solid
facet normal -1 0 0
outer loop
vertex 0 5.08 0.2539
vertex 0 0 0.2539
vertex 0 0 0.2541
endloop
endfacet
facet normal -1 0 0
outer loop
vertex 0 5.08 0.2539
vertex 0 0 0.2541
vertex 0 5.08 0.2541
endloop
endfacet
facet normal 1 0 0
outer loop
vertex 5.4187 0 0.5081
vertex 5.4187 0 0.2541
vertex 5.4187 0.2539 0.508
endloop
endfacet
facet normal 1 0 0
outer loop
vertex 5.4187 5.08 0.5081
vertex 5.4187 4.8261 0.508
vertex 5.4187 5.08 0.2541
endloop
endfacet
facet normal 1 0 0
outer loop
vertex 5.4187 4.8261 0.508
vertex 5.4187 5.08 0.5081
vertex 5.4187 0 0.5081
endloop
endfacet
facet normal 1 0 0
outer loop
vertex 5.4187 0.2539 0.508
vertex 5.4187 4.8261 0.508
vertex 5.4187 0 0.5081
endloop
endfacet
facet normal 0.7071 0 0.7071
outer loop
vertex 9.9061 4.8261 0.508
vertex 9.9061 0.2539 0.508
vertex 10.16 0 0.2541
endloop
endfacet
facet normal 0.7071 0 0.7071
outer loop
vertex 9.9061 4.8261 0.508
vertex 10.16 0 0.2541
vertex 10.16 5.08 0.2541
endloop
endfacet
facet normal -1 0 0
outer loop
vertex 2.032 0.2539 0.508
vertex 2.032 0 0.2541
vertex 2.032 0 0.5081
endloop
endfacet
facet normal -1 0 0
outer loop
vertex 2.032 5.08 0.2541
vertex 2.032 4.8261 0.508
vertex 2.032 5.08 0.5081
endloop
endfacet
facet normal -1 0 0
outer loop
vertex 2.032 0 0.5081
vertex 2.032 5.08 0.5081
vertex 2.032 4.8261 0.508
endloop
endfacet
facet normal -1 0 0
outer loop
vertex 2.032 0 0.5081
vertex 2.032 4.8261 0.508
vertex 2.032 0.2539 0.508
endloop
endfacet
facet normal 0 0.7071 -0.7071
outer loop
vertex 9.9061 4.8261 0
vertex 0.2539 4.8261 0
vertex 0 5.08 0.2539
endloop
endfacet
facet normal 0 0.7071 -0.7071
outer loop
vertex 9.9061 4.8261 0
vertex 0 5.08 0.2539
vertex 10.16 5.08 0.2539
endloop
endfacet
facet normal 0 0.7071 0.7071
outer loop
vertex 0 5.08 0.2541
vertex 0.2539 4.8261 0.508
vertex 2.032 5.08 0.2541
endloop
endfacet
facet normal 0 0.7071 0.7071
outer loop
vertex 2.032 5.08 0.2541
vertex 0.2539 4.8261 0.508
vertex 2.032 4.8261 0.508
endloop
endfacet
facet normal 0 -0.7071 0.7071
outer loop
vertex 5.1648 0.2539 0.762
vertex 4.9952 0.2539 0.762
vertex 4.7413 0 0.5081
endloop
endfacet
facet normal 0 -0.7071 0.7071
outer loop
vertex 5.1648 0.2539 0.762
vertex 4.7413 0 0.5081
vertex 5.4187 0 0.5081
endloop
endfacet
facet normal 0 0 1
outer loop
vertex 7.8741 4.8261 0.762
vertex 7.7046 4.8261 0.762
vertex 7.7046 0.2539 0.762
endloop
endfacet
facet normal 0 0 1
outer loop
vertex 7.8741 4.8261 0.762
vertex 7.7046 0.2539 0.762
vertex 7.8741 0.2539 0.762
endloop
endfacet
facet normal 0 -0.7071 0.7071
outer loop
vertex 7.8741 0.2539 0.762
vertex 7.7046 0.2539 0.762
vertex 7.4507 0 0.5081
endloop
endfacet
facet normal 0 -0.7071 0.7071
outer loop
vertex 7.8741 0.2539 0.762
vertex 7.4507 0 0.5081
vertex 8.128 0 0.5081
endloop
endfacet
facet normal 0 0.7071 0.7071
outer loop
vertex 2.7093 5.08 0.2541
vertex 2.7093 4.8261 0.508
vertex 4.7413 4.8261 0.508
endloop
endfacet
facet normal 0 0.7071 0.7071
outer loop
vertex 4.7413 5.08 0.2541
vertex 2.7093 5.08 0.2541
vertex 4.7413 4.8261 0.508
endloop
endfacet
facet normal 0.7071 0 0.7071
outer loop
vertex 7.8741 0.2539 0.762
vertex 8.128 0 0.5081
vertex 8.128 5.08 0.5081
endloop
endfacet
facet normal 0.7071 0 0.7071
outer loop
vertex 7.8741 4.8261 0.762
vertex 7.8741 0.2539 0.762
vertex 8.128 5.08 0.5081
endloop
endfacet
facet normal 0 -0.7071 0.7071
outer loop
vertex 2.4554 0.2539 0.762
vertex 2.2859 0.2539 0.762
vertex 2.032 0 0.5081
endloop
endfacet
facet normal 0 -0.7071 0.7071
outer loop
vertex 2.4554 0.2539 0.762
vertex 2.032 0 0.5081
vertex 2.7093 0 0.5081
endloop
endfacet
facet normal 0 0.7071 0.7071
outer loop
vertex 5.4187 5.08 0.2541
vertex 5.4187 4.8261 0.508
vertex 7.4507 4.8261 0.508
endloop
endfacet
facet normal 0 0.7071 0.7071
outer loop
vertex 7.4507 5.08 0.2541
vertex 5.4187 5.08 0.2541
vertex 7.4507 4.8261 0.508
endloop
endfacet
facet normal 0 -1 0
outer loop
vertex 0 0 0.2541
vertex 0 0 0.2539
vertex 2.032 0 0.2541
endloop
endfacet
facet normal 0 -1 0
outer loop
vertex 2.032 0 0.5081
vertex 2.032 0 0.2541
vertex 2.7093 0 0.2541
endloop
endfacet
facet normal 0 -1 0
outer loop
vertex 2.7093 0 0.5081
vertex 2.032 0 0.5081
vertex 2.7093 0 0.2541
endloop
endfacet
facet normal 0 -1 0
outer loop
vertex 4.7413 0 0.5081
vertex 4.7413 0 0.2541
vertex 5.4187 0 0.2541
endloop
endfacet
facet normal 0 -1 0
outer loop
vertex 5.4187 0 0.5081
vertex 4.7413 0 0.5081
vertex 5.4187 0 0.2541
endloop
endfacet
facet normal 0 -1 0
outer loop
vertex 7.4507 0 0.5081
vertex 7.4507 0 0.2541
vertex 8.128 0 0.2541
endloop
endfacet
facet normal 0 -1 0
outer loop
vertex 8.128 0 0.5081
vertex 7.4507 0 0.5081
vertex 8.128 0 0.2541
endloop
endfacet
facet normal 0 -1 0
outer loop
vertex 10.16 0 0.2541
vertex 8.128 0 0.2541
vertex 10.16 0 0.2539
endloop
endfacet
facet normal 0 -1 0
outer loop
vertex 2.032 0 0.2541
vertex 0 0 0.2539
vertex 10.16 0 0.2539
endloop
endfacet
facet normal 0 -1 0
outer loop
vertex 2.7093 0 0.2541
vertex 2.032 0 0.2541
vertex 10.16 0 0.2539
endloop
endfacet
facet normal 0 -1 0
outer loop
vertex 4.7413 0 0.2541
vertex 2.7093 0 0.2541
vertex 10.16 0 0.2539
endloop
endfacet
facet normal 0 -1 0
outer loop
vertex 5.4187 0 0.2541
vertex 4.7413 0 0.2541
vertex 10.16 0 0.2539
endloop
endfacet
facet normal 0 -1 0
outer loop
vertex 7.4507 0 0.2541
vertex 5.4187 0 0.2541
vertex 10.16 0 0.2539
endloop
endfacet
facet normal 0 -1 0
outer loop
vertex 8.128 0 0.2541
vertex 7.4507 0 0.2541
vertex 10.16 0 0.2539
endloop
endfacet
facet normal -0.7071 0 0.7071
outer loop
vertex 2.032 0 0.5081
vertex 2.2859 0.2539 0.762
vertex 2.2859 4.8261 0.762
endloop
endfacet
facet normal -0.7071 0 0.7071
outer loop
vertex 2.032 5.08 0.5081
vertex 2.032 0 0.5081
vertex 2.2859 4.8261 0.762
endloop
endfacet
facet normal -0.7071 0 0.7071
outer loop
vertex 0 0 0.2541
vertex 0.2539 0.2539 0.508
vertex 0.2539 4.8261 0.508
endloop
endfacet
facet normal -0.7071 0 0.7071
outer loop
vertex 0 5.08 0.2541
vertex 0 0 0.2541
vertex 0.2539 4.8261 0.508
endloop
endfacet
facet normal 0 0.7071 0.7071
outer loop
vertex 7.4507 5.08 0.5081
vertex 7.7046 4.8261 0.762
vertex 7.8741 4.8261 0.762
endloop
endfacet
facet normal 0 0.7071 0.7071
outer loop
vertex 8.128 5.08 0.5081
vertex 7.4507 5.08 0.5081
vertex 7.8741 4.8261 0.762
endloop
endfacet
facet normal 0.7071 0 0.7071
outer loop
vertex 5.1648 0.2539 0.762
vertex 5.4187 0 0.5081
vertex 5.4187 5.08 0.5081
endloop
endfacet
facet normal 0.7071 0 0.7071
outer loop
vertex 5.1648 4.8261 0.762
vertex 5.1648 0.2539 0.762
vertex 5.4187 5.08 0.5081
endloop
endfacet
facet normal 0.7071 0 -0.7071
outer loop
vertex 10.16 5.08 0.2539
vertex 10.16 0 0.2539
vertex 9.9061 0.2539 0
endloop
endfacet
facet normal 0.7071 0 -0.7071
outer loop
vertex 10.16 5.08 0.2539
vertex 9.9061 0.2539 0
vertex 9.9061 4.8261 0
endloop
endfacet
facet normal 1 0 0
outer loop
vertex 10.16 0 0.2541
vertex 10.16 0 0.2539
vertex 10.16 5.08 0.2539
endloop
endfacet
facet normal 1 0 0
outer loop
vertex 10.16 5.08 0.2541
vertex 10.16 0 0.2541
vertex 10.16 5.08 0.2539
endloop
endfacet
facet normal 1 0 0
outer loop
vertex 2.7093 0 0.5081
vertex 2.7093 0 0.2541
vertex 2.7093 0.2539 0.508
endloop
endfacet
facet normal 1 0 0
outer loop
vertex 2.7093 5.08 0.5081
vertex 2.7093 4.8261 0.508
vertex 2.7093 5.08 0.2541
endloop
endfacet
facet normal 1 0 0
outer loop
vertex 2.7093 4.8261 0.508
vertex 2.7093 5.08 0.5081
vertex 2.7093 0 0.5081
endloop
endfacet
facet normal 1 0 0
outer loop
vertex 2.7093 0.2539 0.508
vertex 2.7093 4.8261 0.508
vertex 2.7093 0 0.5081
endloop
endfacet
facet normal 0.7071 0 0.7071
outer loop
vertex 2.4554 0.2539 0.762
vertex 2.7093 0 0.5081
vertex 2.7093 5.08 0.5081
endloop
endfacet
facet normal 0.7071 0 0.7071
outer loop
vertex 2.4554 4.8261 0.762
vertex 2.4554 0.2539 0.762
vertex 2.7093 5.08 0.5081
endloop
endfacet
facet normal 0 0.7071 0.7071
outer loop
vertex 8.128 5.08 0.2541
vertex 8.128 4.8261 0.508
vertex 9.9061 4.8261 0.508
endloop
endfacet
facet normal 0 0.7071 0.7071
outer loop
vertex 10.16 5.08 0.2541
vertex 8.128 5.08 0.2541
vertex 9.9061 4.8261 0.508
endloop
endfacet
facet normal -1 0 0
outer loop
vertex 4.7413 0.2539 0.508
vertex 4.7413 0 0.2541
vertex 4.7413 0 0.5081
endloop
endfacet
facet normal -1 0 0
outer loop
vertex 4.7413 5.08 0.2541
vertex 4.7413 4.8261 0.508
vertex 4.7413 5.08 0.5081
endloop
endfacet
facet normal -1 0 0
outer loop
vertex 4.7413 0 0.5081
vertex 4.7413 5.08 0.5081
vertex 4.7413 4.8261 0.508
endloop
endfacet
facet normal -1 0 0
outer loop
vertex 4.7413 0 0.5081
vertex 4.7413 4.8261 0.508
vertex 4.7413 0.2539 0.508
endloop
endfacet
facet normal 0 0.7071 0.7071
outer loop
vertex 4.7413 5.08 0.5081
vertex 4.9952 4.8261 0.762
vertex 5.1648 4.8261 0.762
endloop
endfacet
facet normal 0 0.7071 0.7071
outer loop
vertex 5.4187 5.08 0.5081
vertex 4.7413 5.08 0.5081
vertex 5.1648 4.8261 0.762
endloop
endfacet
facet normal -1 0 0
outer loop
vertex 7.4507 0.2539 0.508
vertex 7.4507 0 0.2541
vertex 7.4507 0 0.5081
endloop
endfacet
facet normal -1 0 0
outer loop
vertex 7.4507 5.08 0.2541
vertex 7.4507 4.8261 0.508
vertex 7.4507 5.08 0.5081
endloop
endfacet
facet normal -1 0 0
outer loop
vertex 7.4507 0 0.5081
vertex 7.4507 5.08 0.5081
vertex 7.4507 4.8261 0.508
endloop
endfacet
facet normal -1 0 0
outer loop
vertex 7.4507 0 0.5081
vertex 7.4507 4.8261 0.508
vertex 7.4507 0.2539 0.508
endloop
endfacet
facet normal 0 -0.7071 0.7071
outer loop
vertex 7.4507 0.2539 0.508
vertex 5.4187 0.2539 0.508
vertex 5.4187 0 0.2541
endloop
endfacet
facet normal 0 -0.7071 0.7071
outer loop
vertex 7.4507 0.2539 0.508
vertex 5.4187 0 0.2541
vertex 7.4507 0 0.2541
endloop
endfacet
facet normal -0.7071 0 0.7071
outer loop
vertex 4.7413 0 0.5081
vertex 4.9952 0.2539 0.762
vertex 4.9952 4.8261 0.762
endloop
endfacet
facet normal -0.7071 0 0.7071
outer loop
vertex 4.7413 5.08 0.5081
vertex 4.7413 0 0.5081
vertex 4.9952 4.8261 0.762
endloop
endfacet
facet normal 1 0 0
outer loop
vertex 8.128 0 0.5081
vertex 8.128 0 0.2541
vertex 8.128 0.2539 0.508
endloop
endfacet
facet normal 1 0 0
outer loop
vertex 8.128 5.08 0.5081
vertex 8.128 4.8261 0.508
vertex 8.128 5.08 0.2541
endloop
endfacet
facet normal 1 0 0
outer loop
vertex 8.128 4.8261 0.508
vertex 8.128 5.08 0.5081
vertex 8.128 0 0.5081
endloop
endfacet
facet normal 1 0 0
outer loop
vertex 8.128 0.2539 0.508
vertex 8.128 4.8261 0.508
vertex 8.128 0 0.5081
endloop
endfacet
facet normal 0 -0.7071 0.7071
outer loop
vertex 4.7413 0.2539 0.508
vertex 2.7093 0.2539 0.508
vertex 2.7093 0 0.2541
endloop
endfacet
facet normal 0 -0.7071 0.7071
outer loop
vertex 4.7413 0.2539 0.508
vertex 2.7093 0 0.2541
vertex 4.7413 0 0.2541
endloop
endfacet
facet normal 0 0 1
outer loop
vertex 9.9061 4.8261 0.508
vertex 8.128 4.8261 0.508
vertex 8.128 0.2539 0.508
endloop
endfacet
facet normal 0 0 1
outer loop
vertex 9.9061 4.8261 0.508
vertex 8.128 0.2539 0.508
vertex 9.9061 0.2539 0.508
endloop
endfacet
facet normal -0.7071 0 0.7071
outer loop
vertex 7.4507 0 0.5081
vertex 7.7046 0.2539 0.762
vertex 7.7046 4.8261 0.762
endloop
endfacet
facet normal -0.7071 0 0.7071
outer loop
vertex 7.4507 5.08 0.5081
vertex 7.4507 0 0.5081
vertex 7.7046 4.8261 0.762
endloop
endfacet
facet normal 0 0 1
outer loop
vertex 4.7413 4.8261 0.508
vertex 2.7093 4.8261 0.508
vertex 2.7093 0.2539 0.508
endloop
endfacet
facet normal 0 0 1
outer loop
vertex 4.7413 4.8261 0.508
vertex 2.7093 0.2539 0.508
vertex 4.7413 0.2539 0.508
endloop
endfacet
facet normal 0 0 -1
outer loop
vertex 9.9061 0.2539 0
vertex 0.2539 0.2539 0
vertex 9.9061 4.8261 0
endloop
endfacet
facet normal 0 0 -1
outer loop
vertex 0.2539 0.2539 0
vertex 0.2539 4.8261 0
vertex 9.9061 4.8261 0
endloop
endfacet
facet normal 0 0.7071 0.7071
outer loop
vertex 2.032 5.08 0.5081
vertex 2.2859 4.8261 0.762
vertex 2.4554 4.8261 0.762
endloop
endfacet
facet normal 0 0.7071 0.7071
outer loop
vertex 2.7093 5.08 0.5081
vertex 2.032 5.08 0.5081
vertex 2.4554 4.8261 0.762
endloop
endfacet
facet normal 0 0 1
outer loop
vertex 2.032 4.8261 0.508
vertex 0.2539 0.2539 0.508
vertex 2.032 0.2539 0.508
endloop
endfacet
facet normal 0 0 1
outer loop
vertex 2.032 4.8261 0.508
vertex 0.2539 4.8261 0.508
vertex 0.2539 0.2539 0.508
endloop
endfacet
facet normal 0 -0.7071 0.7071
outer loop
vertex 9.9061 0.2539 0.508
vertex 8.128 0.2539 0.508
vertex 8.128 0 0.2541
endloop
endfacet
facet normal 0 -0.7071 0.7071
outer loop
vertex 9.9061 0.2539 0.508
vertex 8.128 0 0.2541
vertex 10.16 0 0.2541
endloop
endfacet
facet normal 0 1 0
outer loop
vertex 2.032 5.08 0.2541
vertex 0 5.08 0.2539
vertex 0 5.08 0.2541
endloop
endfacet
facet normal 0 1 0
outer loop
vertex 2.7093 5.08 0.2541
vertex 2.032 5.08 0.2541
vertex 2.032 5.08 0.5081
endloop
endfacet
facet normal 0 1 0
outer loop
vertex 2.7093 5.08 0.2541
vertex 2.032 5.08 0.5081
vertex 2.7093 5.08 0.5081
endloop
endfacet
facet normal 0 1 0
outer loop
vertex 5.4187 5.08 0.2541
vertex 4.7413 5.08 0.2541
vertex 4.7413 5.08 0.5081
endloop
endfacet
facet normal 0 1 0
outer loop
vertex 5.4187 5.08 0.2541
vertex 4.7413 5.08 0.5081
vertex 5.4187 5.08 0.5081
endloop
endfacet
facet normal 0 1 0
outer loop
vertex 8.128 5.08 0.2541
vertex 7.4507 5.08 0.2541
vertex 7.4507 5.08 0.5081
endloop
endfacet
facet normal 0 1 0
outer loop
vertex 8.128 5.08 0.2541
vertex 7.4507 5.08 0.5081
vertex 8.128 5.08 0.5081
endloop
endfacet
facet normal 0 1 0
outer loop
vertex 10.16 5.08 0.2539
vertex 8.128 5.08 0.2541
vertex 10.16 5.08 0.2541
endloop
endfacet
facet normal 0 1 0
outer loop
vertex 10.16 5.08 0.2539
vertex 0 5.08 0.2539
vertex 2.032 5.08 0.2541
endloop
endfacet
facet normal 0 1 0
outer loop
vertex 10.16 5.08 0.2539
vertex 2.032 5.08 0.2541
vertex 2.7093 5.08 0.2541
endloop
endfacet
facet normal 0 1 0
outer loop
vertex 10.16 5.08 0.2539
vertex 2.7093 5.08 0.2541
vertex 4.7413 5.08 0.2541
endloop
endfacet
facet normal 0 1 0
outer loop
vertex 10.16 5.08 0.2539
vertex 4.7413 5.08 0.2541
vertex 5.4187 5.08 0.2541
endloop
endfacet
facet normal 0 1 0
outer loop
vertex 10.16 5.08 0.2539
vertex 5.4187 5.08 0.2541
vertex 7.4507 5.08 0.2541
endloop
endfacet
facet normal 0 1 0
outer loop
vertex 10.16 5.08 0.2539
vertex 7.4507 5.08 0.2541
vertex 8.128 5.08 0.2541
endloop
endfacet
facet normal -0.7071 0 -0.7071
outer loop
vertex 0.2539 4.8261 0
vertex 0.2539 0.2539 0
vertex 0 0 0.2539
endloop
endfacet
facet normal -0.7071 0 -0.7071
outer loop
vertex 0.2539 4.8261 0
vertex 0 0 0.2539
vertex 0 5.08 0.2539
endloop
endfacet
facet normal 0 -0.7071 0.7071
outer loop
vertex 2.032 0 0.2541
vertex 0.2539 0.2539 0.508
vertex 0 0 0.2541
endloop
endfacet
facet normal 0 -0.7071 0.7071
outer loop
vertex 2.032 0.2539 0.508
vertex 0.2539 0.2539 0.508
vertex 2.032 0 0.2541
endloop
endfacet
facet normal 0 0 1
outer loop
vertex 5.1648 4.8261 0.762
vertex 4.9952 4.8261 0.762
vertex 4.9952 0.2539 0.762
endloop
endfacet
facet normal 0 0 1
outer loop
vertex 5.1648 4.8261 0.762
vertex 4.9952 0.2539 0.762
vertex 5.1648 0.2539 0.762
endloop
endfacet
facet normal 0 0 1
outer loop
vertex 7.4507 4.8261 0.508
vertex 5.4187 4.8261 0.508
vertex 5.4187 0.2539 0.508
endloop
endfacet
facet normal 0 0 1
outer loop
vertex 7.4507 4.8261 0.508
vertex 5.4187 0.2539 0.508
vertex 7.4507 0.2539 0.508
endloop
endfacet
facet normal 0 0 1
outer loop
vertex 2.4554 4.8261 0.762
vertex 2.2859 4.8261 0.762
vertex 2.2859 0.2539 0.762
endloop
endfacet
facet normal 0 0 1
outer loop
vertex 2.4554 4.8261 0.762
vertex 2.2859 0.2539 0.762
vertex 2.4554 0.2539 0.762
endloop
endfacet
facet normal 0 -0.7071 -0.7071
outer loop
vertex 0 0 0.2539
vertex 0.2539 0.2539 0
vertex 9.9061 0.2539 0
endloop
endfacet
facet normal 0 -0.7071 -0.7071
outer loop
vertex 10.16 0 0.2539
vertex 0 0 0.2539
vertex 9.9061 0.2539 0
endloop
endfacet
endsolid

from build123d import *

# Parameters (mm, degrees)
SKETCH1_W           = 10.16
SKETCH1_H           = 5.08
BOSS_EXTRUDE1_DEPTH = 0.508
SKETCH2_W           = 0.6773418
SKETCH2_H           = 5.08
BOSS_EXTRUDE2_DEPTH = 0.254
CHAMFER3_SIZE       = 0.254
CHAMFER4_SIZE       = 0.254
CHAMFER5_SIZE       = 0.254


with BuildPart() as part:
    # Sketch1 → Boss-Extrude1 (new body)
    with BuildSketch(Plane.XY):
        with Locations((5.08, 2.54)):
            Rectangle(SKETCH1_W, SKETCH1_H)
    extrude(amount=BOSS_EXTRUDE1_DEPTH)

    # Sketch2 → Boss-Extrude2 (add)
    with BuildSketch(Plane.XY.offset(0.508)):
        with Locations((2.3706709, 2.54)):
            Rectangle(SKETCH2_W, SKETCH2_H)
        with Locations((5.0800127, 2.54)):
            Rectangle(SKETCH2_W, SKETCH2_H)
        with Locations((7.7893545, 2.54)):
            Rectangle(SKETCH2_W, SKETCH2_H)
    extrude(amount=BOSS_EXTRUDE2_DEPTH)

    # Chamfer3
    chamfer3_edges = [part.edges().sort_by_distance(p)[0] for p in [
        (5.08, 5.08, 0),
        (10.16, 2.54, 0),
        (5.08, 0, 0),
        (1.016, 0, 0.508),
        (3.7253418, 0, 0.508),
        (6.4346836, 0, 0.508),
        (9.1440127, 0, 0.508),
        (10.16, 2.54, 0.508),
        (9.1440127, 5.08, 0.508),
        (6.4346836, 5.08, 0.508),
        (3.7253418, 5.08, 0.508),
        (1.016, 5.08, 0.508),
    ]]
    chamfer(chamfer3_edges, length=CHAMFER3_SIZE - 0.0001)  # a hair under: the kernel refuses the full size

    # Chamfer4
    chamfer4_edges = [part.edges().sort_by_distance(p)[0] for p in [
        (0, 2.54, 0),
        (0, 2.54, 0.508),
    ]]
    chamfer(chamfer4_edges, length=CHAMFER4_SIZE - 0.0001)  # a hair under: the kernel refuses the full size

    # Chamfer5
    chamfer5_edges = [part.edges().sort_by_distance(p)[0] for p in [
        (2.3706709, 5.08, 0.762),
        (2.7093418, 2.54, 0.762),
        (2.032, 2.54, 0.762),
        (2.3706709, 0, 0.762),
        (5.4186836, 2.54, 0.762),
        (5.0800127, 5.08, 0.762),
        (4.7413418, 2.54, 0.762),
        (5.0800127, 0, 0.762),
        (8.1280254, 2.54, 0.762),
        (7.7893545, 5.08, 0.762),
        (7.4506836, 2.54, 0.762),
        (7.7893545, 0, 0.762),
    ]]
    chamfer(chamfer5_edges, length=CHAMFER5_SIZE - 0.0001)  # a hair under: the kernel refuses the full size


solid = part.part
